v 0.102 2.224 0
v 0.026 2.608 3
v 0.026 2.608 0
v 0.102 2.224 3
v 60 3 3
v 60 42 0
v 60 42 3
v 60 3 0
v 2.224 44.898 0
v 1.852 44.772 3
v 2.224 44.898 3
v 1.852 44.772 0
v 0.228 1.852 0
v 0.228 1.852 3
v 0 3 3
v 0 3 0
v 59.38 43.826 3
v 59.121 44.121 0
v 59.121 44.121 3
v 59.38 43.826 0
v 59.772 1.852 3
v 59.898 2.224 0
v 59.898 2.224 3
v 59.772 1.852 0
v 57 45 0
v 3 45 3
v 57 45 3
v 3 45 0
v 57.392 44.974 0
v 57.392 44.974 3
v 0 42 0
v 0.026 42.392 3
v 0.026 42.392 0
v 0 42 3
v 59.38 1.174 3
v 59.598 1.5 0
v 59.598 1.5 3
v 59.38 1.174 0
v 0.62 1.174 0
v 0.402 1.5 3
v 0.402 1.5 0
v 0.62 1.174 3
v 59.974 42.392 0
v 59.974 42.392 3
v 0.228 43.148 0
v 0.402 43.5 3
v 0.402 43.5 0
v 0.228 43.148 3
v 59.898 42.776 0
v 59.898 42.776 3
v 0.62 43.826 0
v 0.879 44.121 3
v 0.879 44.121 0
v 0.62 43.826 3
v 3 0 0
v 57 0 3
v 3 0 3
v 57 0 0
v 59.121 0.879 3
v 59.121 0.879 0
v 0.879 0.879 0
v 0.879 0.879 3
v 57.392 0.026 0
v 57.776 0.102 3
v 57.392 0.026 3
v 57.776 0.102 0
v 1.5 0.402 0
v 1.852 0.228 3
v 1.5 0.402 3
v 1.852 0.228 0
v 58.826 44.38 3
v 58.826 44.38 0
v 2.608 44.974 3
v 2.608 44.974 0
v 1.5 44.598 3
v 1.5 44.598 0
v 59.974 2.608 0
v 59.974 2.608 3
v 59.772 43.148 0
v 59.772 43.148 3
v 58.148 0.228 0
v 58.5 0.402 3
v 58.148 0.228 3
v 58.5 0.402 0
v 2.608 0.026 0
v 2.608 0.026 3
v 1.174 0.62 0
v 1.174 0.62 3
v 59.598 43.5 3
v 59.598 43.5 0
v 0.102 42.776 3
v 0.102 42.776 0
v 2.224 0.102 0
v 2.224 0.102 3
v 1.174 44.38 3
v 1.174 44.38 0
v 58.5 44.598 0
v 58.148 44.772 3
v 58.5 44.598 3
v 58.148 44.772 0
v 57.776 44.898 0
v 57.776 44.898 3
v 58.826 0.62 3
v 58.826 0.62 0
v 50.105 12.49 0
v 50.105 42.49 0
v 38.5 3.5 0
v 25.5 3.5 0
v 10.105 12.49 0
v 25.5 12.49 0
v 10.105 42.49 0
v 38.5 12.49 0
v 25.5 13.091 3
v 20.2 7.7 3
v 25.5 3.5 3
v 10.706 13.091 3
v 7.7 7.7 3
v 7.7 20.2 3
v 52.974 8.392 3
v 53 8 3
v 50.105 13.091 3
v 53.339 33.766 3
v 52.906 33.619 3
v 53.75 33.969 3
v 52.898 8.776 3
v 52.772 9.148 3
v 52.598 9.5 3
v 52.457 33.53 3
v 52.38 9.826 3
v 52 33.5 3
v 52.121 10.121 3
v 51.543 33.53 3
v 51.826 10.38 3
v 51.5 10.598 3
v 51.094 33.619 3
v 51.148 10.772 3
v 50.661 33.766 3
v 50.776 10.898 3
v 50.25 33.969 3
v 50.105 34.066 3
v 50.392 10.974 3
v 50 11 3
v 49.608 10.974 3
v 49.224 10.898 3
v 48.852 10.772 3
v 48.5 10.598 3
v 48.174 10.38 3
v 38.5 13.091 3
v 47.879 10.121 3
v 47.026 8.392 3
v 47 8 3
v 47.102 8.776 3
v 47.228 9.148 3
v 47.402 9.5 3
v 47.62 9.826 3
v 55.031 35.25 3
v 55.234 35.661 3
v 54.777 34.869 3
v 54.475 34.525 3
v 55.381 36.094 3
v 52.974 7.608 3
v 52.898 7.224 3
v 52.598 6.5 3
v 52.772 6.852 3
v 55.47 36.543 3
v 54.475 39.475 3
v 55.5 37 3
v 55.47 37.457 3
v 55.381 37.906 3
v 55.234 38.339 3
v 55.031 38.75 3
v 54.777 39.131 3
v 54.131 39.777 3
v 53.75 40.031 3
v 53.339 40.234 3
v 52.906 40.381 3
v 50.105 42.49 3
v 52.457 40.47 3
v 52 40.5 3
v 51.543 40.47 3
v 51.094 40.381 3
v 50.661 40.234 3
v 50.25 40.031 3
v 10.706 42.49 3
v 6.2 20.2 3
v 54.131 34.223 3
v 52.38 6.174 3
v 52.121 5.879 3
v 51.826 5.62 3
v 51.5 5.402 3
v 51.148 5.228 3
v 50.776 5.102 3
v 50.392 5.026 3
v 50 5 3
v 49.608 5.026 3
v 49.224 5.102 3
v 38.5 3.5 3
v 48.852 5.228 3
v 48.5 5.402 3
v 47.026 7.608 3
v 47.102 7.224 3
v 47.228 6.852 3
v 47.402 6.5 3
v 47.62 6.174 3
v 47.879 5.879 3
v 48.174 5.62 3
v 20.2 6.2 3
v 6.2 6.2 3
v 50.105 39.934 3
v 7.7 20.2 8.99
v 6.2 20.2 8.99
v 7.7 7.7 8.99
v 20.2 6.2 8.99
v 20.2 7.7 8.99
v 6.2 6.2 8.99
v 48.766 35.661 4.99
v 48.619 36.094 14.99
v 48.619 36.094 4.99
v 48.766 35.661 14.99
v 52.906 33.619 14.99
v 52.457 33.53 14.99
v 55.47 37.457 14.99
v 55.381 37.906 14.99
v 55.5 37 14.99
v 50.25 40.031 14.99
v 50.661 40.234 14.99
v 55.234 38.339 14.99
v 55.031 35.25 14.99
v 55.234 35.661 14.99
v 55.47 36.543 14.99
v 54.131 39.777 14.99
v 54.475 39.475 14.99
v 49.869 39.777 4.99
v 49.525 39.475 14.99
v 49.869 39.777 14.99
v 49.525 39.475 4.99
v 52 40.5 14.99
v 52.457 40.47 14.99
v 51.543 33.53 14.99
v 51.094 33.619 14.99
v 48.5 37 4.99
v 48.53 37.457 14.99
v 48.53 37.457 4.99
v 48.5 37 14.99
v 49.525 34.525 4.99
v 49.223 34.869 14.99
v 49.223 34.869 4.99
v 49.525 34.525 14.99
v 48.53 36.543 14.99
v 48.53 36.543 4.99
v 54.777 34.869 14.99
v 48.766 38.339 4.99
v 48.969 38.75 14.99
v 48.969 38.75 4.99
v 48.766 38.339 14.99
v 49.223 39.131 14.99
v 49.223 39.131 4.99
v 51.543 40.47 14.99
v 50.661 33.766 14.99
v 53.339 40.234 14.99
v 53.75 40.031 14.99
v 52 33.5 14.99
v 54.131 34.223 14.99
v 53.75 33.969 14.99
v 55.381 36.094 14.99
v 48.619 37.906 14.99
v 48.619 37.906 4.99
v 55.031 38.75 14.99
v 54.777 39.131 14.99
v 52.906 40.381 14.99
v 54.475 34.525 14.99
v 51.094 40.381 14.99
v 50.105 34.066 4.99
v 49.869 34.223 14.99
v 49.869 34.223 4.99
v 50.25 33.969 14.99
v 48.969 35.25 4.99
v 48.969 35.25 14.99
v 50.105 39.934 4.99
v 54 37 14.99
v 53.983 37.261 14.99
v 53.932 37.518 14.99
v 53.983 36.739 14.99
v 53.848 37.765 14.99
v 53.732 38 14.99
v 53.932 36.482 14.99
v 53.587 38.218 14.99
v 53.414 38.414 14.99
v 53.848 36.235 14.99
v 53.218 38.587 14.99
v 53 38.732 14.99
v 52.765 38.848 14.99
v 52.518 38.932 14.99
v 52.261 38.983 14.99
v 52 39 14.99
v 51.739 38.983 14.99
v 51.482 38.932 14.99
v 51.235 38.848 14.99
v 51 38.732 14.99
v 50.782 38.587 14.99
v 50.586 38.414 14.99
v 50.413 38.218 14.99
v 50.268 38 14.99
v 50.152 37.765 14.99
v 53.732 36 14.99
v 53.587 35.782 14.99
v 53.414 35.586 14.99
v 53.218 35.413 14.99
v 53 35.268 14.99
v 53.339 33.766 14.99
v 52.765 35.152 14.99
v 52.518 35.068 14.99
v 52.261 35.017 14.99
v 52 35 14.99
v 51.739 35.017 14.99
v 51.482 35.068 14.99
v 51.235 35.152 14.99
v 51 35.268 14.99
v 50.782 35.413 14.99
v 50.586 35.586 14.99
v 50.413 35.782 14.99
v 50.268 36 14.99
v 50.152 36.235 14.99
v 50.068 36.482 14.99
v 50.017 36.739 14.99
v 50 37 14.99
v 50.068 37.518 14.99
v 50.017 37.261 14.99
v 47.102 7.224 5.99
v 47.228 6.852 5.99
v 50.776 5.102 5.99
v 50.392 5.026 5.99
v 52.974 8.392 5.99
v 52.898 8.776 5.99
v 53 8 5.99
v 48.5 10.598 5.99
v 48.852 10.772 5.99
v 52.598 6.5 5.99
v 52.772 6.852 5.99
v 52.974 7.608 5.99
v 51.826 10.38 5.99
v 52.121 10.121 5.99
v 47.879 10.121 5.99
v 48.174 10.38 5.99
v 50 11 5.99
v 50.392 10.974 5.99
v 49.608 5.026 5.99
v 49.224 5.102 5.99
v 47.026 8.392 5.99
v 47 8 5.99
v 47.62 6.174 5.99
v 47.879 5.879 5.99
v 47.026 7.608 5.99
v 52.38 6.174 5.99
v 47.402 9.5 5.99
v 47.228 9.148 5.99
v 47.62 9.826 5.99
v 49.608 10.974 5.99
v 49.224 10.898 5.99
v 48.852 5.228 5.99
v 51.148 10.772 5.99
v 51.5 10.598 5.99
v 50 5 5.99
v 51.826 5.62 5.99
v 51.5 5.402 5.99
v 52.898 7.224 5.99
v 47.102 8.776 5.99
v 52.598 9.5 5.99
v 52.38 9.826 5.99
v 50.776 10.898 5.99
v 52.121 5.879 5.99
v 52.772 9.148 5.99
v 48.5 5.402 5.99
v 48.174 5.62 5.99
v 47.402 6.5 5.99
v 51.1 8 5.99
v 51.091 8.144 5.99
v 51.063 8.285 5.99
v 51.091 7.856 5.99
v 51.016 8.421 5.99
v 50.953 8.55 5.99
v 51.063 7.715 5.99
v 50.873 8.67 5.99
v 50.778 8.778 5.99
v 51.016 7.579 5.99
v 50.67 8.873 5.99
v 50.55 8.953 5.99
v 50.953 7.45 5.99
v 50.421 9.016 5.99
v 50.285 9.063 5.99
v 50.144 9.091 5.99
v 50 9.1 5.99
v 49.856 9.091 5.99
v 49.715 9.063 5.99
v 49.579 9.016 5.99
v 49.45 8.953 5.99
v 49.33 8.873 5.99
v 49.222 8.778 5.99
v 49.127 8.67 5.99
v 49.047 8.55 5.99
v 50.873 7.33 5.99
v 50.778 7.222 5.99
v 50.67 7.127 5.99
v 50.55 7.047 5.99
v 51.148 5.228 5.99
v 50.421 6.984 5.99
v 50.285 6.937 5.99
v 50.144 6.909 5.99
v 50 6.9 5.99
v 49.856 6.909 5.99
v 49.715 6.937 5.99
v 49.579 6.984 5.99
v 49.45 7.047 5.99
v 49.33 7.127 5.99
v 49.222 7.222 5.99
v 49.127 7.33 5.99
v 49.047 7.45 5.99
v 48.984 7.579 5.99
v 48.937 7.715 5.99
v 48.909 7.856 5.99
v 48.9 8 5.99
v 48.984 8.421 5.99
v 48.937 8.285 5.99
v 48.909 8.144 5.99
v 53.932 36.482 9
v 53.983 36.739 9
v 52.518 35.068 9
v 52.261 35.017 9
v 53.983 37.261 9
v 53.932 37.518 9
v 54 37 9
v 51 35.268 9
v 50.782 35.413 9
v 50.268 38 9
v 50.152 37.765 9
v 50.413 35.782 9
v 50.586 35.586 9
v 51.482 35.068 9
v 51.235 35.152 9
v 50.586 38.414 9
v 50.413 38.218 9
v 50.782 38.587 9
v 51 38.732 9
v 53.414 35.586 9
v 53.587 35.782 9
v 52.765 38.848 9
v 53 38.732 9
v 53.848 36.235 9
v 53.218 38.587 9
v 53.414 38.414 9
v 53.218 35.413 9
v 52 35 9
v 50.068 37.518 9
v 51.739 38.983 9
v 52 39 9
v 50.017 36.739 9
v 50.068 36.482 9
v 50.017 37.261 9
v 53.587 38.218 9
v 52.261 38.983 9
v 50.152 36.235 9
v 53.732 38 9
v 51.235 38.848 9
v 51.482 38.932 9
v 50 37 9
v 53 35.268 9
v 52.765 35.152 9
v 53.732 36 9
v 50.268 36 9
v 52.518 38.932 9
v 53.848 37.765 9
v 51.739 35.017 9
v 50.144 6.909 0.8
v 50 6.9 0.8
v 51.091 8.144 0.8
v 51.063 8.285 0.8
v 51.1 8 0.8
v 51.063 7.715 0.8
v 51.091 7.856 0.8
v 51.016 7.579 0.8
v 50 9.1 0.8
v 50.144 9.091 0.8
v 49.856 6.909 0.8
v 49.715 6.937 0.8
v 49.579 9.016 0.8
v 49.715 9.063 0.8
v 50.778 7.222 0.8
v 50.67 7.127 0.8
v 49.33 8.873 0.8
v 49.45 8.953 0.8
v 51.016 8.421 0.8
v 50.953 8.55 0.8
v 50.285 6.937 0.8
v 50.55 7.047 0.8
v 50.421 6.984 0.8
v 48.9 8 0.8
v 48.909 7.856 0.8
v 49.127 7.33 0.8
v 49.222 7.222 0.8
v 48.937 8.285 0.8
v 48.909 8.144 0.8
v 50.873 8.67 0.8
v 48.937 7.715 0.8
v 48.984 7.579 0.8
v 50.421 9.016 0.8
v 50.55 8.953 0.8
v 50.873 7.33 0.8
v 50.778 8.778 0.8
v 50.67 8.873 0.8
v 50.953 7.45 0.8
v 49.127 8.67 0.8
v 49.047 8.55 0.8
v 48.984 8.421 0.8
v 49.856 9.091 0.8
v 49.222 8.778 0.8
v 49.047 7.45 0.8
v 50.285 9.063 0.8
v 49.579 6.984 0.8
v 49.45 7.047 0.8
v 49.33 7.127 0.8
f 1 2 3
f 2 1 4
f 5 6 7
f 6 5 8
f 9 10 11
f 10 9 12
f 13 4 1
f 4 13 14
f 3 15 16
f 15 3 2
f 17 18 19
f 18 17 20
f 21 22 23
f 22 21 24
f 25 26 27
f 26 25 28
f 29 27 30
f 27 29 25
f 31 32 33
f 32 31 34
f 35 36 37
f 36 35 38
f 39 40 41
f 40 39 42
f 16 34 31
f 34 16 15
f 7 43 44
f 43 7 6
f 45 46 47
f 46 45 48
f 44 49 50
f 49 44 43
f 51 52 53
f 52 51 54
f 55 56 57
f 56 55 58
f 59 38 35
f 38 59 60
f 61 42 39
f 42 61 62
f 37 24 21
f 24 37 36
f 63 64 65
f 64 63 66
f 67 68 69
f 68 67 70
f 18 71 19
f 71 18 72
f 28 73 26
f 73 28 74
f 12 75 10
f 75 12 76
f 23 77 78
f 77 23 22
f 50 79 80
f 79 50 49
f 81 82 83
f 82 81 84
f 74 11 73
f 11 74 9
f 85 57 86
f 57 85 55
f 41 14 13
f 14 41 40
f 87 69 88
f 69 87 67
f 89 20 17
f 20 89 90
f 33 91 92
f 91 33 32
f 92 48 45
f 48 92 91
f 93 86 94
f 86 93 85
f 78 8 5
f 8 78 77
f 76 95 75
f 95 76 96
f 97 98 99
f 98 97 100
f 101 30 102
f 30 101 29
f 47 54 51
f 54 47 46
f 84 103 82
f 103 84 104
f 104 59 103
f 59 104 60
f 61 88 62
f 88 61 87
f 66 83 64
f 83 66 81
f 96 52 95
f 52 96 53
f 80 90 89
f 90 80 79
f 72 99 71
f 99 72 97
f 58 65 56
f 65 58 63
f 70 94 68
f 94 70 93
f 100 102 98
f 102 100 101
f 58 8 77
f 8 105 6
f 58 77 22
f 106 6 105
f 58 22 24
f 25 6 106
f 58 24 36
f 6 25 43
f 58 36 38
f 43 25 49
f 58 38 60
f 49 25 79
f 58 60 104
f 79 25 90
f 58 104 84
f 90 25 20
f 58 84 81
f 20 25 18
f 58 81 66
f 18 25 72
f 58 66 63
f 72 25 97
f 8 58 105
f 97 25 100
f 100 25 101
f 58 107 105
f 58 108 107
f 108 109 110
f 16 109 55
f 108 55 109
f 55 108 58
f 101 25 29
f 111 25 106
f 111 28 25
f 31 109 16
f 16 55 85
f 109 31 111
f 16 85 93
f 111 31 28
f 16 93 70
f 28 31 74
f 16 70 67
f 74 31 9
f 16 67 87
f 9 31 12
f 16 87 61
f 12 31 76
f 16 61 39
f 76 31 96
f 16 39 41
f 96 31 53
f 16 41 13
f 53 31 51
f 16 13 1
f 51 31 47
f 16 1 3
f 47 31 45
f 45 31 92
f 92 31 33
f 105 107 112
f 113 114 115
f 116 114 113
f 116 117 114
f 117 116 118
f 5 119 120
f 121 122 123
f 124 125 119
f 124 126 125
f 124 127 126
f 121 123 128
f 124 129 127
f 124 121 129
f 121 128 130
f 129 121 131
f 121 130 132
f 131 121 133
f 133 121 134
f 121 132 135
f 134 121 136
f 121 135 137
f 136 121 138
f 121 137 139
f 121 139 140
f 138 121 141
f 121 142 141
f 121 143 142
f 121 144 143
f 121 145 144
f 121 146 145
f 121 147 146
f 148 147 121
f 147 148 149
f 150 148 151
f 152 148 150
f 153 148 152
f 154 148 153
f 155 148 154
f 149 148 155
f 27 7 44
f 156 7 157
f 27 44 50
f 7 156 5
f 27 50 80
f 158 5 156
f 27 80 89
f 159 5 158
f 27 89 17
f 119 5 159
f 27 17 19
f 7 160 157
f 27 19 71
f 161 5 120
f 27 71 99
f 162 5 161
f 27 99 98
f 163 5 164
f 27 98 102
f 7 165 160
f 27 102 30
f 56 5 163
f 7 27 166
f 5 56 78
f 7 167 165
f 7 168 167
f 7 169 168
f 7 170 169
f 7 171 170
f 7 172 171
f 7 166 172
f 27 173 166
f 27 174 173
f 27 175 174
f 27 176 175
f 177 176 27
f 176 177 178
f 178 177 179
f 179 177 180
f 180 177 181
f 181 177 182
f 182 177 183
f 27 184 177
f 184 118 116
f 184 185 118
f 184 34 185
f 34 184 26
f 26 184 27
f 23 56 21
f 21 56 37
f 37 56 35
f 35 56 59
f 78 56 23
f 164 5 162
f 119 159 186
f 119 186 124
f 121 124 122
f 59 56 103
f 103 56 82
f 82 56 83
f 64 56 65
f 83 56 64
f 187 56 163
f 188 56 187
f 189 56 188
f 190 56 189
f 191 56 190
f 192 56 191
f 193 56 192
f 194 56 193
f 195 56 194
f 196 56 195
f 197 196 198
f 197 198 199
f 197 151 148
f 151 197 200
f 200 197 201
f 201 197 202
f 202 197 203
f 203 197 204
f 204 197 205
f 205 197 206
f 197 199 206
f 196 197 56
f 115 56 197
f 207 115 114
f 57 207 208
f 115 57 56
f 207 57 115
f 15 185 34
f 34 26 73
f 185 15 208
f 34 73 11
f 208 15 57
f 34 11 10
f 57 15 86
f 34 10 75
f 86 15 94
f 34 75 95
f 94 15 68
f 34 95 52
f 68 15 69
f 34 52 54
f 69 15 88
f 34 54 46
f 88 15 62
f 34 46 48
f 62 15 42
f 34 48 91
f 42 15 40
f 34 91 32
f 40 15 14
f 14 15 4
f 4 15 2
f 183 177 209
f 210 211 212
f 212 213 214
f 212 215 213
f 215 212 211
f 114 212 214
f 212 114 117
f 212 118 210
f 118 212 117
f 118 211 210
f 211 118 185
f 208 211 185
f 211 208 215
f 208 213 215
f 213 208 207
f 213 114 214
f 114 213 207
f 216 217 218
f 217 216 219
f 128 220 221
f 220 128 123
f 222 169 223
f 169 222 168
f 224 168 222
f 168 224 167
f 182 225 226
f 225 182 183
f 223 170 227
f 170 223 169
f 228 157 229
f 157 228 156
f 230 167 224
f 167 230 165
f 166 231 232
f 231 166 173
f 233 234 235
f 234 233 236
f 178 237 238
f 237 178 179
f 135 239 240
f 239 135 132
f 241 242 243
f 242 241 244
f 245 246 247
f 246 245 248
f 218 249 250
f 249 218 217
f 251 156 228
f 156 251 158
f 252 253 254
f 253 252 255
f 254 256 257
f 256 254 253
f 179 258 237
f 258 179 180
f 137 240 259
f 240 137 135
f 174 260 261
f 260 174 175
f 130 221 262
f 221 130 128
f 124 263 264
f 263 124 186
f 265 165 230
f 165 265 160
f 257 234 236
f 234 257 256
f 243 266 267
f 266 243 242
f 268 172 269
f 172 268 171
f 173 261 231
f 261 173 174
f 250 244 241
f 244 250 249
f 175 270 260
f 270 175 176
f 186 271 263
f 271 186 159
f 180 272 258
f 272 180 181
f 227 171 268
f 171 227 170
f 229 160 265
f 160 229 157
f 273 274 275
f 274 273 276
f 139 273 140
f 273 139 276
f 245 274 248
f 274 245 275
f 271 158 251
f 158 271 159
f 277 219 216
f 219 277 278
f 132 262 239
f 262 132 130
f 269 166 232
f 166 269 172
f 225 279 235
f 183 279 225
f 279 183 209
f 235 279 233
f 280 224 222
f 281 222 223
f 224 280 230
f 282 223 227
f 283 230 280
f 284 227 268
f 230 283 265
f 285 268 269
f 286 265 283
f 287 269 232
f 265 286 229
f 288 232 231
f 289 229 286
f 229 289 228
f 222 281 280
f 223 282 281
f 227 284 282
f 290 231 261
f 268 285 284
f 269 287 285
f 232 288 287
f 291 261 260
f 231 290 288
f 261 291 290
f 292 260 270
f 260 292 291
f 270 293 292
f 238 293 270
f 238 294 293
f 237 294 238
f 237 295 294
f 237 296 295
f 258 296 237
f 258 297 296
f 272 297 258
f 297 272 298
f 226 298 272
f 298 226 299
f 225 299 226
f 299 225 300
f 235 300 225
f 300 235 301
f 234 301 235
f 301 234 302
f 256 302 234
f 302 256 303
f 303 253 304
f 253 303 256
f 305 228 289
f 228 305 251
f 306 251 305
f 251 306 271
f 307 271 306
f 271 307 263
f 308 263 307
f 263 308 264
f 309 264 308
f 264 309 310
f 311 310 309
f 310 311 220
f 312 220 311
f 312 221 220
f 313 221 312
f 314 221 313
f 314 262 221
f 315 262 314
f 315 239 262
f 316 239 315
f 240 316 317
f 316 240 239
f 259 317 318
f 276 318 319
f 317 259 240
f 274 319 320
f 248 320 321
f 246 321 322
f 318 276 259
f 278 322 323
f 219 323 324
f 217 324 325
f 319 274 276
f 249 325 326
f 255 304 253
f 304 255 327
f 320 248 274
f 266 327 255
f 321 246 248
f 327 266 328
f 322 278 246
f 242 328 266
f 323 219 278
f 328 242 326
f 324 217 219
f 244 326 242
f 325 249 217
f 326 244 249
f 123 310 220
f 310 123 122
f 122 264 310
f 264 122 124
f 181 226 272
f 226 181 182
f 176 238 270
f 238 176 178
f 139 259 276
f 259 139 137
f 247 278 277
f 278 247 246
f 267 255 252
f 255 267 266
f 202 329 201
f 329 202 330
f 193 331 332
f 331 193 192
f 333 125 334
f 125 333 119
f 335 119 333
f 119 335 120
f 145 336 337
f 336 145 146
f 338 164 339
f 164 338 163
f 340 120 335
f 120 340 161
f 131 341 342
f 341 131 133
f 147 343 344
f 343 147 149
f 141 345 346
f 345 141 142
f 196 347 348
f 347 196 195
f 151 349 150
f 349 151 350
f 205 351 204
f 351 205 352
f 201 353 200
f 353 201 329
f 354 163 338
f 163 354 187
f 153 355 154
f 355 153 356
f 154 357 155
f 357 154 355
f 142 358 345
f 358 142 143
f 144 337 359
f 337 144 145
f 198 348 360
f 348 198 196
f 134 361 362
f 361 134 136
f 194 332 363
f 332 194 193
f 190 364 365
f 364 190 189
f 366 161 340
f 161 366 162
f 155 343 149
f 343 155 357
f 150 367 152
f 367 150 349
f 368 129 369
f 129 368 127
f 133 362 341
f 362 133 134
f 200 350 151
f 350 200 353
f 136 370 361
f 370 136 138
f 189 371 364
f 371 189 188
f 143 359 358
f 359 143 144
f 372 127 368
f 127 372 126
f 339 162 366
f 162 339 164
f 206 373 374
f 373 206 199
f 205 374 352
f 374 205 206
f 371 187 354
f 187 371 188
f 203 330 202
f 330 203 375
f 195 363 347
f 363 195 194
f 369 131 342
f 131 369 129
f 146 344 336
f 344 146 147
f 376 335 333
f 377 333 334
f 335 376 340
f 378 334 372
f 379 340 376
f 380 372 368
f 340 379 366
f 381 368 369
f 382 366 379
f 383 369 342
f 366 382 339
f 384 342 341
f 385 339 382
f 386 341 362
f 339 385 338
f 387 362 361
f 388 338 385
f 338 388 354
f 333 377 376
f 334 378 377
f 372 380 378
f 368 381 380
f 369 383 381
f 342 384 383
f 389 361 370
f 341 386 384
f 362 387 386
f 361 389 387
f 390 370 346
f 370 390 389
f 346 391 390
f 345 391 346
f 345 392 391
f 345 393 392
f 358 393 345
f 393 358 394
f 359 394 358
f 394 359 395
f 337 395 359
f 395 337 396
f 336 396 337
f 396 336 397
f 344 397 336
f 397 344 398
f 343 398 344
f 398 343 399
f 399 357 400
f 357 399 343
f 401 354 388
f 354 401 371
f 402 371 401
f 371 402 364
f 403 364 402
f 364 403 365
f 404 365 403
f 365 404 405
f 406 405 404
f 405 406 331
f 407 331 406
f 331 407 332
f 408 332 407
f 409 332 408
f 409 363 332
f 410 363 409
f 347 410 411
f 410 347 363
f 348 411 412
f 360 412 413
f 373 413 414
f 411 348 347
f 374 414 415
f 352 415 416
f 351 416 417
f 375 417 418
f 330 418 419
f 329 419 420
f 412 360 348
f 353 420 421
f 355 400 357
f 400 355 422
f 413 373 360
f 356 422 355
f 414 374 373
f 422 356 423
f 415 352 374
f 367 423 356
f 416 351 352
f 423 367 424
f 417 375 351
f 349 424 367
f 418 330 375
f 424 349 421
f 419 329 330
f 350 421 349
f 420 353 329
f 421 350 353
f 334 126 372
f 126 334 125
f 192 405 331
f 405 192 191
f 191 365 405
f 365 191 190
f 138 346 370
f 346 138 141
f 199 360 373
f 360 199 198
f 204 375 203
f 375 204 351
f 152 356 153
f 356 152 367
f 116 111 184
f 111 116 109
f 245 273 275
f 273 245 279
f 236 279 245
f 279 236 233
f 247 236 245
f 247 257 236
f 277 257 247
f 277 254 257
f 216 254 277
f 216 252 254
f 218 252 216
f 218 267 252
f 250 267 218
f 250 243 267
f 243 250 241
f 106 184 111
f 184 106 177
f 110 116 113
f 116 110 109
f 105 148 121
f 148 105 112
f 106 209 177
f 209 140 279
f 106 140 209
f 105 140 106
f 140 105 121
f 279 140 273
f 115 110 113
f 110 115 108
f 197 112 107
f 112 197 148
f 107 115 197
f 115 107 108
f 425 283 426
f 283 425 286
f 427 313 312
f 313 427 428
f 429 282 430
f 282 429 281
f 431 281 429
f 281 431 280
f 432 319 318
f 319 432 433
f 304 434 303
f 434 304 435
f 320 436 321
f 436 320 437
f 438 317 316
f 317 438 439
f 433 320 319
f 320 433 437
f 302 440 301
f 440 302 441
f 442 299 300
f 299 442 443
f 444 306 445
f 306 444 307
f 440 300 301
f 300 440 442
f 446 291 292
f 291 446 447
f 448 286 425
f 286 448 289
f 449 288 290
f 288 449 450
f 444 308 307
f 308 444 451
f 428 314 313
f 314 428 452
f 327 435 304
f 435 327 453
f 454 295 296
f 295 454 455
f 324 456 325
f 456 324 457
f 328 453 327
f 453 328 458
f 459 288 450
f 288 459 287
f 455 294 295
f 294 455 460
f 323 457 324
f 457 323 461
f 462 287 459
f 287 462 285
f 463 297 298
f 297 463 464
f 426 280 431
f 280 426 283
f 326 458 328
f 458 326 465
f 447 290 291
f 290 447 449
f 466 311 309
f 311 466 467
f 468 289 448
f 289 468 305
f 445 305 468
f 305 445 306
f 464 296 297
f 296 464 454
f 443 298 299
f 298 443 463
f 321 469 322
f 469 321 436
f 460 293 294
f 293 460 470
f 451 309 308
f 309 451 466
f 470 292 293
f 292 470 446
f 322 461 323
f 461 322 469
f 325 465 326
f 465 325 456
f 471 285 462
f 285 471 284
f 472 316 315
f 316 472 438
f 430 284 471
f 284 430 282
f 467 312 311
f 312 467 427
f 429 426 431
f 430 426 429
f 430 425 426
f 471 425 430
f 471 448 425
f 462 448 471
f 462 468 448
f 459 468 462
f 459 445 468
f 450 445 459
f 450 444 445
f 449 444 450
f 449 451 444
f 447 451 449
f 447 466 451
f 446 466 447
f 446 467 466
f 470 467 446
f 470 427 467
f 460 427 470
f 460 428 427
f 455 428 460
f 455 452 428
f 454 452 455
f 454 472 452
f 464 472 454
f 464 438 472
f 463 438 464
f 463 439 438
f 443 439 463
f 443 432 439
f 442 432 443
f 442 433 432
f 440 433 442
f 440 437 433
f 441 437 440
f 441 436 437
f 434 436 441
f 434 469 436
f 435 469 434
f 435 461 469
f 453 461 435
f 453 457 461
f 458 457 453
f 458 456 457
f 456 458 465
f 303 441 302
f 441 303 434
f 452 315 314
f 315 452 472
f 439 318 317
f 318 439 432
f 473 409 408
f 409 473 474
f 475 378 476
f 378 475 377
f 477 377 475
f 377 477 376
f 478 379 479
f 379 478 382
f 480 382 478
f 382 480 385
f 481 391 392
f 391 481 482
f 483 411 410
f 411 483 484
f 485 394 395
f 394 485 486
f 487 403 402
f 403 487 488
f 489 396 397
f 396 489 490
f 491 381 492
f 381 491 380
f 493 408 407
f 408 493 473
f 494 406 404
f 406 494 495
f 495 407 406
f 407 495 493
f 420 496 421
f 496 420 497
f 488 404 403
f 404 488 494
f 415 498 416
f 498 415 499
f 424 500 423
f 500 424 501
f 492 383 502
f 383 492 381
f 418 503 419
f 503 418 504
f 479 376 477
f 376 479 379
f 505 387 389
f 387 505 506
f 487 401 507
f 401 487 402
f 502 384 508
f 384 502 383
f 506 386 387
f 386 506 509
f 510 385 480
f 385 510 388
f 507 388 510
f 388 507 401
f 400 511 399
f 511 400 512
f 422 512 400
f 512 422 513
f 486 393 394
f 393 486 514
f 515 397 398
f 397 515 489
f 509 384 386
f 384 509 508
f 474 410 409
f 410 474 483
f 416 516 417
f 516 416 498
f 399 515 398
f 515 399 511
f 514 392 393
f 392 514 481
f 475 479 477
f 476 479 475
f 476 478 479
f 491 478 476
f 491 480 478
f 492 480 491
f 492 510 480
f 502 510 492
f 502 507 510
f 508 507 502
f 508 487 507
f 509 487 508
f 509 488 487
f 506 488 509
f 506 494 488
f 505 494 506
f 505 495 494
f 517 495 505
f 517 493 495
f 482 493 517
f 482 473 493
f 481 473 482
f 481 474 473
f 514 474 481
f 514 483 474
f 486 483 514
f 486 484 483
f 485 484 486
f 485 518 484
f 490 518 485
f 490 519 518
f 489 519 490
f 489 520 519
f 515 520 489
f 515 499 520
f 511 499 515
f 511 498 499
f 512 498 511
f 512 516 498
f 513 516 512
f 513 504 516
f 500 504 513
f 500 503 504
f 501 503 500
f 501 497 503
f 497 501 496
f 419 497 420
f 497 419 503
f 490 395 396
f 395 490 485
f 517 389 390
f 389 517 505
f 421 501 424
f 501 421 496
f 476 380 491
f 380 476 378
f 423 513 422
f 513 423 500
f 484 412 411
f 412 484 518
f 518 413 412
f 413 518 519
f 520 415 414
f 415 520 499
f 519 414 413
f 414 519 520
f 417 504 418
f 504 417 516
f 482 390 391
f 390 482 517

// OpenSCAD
// PiSDR test coupon - print this BEFORE the full enclosure.
// A 60 x 45 mm slice of the faceplate containing: one window corner with its lip and
// display locator tab, one keycap hole, the encoder bushing hole with its thinning, a
// corner boss with the heat-set insert hole and a carrier screw hole. Check:
//   * the display corner drops between the tabs with light friction,
//   * a keycap slides in the hole without binding,
//   * the EC11 nut tightens on the bushing through the panel,
//   * the heat-set insert seats and an M3 screw threads in.
include <pisdr_params.scad>

coupon = [60, 45];

module coupon_part() {
    difference() {
        union() {
            linear_extrude(face_t) rounded_rect(coupon, 3);
            // display corner tabs (bottom-left corner of the module placed at [8, 8])
            translate([8 - display_clear - 1.5, 8 - display_clear - 1.5, face_t - eps]) linear_extrude(6) {
                square([1.5, 14]);
                square([14, 1.5]);
            }
            // corner boss
            translate([52, 37, face_t - eps]) cylinder(d = boss_d, h = 12);
            // carrier screw boss
            translate([50, 8, face_t - eps]) cylinder(d = 6, h = 3);
        }
        // window corner: lip = window_margin inside the module edge
        translate([8 + (active_off_left - window_margin), 8 + (active_off_bottom - window_margin), -eps])
            hull() {
                translate([-1, -1, 0]) linear_extrude(eps) square([40, 30]);
                translate([0, 0, 1]) linear_extrude(face_t + 1) square([39, 29]);
            }
        // keycap hole
        translate([32, 10, -eps]) linear_extrude(face_t + 1) square(keycap_hole, center = true);
        // encoder hole + thinning
        translate([46, 22, -eps]) cylinder(d = enc_bushing_d, h = face_t + 1);
        thin_t = max(0, face_t - (enc_bushing_len - 2.5));
        if (thin_t > 0) translate([46, 22, face_t - thin_t]) cylinder(d = 14, h = thin_t + 1);
        // insert hole in the boss
        translate([52, 37, face_t + 12 - insert_depth]) cylinder(d = insert_hole_d, h = insert_depth + 1);
        // carrier screw
        translate([50, 8, 0.8]) cylinder(d = carrier_screw_d, h = face_t + 3);
    }
}

coupon_part();
